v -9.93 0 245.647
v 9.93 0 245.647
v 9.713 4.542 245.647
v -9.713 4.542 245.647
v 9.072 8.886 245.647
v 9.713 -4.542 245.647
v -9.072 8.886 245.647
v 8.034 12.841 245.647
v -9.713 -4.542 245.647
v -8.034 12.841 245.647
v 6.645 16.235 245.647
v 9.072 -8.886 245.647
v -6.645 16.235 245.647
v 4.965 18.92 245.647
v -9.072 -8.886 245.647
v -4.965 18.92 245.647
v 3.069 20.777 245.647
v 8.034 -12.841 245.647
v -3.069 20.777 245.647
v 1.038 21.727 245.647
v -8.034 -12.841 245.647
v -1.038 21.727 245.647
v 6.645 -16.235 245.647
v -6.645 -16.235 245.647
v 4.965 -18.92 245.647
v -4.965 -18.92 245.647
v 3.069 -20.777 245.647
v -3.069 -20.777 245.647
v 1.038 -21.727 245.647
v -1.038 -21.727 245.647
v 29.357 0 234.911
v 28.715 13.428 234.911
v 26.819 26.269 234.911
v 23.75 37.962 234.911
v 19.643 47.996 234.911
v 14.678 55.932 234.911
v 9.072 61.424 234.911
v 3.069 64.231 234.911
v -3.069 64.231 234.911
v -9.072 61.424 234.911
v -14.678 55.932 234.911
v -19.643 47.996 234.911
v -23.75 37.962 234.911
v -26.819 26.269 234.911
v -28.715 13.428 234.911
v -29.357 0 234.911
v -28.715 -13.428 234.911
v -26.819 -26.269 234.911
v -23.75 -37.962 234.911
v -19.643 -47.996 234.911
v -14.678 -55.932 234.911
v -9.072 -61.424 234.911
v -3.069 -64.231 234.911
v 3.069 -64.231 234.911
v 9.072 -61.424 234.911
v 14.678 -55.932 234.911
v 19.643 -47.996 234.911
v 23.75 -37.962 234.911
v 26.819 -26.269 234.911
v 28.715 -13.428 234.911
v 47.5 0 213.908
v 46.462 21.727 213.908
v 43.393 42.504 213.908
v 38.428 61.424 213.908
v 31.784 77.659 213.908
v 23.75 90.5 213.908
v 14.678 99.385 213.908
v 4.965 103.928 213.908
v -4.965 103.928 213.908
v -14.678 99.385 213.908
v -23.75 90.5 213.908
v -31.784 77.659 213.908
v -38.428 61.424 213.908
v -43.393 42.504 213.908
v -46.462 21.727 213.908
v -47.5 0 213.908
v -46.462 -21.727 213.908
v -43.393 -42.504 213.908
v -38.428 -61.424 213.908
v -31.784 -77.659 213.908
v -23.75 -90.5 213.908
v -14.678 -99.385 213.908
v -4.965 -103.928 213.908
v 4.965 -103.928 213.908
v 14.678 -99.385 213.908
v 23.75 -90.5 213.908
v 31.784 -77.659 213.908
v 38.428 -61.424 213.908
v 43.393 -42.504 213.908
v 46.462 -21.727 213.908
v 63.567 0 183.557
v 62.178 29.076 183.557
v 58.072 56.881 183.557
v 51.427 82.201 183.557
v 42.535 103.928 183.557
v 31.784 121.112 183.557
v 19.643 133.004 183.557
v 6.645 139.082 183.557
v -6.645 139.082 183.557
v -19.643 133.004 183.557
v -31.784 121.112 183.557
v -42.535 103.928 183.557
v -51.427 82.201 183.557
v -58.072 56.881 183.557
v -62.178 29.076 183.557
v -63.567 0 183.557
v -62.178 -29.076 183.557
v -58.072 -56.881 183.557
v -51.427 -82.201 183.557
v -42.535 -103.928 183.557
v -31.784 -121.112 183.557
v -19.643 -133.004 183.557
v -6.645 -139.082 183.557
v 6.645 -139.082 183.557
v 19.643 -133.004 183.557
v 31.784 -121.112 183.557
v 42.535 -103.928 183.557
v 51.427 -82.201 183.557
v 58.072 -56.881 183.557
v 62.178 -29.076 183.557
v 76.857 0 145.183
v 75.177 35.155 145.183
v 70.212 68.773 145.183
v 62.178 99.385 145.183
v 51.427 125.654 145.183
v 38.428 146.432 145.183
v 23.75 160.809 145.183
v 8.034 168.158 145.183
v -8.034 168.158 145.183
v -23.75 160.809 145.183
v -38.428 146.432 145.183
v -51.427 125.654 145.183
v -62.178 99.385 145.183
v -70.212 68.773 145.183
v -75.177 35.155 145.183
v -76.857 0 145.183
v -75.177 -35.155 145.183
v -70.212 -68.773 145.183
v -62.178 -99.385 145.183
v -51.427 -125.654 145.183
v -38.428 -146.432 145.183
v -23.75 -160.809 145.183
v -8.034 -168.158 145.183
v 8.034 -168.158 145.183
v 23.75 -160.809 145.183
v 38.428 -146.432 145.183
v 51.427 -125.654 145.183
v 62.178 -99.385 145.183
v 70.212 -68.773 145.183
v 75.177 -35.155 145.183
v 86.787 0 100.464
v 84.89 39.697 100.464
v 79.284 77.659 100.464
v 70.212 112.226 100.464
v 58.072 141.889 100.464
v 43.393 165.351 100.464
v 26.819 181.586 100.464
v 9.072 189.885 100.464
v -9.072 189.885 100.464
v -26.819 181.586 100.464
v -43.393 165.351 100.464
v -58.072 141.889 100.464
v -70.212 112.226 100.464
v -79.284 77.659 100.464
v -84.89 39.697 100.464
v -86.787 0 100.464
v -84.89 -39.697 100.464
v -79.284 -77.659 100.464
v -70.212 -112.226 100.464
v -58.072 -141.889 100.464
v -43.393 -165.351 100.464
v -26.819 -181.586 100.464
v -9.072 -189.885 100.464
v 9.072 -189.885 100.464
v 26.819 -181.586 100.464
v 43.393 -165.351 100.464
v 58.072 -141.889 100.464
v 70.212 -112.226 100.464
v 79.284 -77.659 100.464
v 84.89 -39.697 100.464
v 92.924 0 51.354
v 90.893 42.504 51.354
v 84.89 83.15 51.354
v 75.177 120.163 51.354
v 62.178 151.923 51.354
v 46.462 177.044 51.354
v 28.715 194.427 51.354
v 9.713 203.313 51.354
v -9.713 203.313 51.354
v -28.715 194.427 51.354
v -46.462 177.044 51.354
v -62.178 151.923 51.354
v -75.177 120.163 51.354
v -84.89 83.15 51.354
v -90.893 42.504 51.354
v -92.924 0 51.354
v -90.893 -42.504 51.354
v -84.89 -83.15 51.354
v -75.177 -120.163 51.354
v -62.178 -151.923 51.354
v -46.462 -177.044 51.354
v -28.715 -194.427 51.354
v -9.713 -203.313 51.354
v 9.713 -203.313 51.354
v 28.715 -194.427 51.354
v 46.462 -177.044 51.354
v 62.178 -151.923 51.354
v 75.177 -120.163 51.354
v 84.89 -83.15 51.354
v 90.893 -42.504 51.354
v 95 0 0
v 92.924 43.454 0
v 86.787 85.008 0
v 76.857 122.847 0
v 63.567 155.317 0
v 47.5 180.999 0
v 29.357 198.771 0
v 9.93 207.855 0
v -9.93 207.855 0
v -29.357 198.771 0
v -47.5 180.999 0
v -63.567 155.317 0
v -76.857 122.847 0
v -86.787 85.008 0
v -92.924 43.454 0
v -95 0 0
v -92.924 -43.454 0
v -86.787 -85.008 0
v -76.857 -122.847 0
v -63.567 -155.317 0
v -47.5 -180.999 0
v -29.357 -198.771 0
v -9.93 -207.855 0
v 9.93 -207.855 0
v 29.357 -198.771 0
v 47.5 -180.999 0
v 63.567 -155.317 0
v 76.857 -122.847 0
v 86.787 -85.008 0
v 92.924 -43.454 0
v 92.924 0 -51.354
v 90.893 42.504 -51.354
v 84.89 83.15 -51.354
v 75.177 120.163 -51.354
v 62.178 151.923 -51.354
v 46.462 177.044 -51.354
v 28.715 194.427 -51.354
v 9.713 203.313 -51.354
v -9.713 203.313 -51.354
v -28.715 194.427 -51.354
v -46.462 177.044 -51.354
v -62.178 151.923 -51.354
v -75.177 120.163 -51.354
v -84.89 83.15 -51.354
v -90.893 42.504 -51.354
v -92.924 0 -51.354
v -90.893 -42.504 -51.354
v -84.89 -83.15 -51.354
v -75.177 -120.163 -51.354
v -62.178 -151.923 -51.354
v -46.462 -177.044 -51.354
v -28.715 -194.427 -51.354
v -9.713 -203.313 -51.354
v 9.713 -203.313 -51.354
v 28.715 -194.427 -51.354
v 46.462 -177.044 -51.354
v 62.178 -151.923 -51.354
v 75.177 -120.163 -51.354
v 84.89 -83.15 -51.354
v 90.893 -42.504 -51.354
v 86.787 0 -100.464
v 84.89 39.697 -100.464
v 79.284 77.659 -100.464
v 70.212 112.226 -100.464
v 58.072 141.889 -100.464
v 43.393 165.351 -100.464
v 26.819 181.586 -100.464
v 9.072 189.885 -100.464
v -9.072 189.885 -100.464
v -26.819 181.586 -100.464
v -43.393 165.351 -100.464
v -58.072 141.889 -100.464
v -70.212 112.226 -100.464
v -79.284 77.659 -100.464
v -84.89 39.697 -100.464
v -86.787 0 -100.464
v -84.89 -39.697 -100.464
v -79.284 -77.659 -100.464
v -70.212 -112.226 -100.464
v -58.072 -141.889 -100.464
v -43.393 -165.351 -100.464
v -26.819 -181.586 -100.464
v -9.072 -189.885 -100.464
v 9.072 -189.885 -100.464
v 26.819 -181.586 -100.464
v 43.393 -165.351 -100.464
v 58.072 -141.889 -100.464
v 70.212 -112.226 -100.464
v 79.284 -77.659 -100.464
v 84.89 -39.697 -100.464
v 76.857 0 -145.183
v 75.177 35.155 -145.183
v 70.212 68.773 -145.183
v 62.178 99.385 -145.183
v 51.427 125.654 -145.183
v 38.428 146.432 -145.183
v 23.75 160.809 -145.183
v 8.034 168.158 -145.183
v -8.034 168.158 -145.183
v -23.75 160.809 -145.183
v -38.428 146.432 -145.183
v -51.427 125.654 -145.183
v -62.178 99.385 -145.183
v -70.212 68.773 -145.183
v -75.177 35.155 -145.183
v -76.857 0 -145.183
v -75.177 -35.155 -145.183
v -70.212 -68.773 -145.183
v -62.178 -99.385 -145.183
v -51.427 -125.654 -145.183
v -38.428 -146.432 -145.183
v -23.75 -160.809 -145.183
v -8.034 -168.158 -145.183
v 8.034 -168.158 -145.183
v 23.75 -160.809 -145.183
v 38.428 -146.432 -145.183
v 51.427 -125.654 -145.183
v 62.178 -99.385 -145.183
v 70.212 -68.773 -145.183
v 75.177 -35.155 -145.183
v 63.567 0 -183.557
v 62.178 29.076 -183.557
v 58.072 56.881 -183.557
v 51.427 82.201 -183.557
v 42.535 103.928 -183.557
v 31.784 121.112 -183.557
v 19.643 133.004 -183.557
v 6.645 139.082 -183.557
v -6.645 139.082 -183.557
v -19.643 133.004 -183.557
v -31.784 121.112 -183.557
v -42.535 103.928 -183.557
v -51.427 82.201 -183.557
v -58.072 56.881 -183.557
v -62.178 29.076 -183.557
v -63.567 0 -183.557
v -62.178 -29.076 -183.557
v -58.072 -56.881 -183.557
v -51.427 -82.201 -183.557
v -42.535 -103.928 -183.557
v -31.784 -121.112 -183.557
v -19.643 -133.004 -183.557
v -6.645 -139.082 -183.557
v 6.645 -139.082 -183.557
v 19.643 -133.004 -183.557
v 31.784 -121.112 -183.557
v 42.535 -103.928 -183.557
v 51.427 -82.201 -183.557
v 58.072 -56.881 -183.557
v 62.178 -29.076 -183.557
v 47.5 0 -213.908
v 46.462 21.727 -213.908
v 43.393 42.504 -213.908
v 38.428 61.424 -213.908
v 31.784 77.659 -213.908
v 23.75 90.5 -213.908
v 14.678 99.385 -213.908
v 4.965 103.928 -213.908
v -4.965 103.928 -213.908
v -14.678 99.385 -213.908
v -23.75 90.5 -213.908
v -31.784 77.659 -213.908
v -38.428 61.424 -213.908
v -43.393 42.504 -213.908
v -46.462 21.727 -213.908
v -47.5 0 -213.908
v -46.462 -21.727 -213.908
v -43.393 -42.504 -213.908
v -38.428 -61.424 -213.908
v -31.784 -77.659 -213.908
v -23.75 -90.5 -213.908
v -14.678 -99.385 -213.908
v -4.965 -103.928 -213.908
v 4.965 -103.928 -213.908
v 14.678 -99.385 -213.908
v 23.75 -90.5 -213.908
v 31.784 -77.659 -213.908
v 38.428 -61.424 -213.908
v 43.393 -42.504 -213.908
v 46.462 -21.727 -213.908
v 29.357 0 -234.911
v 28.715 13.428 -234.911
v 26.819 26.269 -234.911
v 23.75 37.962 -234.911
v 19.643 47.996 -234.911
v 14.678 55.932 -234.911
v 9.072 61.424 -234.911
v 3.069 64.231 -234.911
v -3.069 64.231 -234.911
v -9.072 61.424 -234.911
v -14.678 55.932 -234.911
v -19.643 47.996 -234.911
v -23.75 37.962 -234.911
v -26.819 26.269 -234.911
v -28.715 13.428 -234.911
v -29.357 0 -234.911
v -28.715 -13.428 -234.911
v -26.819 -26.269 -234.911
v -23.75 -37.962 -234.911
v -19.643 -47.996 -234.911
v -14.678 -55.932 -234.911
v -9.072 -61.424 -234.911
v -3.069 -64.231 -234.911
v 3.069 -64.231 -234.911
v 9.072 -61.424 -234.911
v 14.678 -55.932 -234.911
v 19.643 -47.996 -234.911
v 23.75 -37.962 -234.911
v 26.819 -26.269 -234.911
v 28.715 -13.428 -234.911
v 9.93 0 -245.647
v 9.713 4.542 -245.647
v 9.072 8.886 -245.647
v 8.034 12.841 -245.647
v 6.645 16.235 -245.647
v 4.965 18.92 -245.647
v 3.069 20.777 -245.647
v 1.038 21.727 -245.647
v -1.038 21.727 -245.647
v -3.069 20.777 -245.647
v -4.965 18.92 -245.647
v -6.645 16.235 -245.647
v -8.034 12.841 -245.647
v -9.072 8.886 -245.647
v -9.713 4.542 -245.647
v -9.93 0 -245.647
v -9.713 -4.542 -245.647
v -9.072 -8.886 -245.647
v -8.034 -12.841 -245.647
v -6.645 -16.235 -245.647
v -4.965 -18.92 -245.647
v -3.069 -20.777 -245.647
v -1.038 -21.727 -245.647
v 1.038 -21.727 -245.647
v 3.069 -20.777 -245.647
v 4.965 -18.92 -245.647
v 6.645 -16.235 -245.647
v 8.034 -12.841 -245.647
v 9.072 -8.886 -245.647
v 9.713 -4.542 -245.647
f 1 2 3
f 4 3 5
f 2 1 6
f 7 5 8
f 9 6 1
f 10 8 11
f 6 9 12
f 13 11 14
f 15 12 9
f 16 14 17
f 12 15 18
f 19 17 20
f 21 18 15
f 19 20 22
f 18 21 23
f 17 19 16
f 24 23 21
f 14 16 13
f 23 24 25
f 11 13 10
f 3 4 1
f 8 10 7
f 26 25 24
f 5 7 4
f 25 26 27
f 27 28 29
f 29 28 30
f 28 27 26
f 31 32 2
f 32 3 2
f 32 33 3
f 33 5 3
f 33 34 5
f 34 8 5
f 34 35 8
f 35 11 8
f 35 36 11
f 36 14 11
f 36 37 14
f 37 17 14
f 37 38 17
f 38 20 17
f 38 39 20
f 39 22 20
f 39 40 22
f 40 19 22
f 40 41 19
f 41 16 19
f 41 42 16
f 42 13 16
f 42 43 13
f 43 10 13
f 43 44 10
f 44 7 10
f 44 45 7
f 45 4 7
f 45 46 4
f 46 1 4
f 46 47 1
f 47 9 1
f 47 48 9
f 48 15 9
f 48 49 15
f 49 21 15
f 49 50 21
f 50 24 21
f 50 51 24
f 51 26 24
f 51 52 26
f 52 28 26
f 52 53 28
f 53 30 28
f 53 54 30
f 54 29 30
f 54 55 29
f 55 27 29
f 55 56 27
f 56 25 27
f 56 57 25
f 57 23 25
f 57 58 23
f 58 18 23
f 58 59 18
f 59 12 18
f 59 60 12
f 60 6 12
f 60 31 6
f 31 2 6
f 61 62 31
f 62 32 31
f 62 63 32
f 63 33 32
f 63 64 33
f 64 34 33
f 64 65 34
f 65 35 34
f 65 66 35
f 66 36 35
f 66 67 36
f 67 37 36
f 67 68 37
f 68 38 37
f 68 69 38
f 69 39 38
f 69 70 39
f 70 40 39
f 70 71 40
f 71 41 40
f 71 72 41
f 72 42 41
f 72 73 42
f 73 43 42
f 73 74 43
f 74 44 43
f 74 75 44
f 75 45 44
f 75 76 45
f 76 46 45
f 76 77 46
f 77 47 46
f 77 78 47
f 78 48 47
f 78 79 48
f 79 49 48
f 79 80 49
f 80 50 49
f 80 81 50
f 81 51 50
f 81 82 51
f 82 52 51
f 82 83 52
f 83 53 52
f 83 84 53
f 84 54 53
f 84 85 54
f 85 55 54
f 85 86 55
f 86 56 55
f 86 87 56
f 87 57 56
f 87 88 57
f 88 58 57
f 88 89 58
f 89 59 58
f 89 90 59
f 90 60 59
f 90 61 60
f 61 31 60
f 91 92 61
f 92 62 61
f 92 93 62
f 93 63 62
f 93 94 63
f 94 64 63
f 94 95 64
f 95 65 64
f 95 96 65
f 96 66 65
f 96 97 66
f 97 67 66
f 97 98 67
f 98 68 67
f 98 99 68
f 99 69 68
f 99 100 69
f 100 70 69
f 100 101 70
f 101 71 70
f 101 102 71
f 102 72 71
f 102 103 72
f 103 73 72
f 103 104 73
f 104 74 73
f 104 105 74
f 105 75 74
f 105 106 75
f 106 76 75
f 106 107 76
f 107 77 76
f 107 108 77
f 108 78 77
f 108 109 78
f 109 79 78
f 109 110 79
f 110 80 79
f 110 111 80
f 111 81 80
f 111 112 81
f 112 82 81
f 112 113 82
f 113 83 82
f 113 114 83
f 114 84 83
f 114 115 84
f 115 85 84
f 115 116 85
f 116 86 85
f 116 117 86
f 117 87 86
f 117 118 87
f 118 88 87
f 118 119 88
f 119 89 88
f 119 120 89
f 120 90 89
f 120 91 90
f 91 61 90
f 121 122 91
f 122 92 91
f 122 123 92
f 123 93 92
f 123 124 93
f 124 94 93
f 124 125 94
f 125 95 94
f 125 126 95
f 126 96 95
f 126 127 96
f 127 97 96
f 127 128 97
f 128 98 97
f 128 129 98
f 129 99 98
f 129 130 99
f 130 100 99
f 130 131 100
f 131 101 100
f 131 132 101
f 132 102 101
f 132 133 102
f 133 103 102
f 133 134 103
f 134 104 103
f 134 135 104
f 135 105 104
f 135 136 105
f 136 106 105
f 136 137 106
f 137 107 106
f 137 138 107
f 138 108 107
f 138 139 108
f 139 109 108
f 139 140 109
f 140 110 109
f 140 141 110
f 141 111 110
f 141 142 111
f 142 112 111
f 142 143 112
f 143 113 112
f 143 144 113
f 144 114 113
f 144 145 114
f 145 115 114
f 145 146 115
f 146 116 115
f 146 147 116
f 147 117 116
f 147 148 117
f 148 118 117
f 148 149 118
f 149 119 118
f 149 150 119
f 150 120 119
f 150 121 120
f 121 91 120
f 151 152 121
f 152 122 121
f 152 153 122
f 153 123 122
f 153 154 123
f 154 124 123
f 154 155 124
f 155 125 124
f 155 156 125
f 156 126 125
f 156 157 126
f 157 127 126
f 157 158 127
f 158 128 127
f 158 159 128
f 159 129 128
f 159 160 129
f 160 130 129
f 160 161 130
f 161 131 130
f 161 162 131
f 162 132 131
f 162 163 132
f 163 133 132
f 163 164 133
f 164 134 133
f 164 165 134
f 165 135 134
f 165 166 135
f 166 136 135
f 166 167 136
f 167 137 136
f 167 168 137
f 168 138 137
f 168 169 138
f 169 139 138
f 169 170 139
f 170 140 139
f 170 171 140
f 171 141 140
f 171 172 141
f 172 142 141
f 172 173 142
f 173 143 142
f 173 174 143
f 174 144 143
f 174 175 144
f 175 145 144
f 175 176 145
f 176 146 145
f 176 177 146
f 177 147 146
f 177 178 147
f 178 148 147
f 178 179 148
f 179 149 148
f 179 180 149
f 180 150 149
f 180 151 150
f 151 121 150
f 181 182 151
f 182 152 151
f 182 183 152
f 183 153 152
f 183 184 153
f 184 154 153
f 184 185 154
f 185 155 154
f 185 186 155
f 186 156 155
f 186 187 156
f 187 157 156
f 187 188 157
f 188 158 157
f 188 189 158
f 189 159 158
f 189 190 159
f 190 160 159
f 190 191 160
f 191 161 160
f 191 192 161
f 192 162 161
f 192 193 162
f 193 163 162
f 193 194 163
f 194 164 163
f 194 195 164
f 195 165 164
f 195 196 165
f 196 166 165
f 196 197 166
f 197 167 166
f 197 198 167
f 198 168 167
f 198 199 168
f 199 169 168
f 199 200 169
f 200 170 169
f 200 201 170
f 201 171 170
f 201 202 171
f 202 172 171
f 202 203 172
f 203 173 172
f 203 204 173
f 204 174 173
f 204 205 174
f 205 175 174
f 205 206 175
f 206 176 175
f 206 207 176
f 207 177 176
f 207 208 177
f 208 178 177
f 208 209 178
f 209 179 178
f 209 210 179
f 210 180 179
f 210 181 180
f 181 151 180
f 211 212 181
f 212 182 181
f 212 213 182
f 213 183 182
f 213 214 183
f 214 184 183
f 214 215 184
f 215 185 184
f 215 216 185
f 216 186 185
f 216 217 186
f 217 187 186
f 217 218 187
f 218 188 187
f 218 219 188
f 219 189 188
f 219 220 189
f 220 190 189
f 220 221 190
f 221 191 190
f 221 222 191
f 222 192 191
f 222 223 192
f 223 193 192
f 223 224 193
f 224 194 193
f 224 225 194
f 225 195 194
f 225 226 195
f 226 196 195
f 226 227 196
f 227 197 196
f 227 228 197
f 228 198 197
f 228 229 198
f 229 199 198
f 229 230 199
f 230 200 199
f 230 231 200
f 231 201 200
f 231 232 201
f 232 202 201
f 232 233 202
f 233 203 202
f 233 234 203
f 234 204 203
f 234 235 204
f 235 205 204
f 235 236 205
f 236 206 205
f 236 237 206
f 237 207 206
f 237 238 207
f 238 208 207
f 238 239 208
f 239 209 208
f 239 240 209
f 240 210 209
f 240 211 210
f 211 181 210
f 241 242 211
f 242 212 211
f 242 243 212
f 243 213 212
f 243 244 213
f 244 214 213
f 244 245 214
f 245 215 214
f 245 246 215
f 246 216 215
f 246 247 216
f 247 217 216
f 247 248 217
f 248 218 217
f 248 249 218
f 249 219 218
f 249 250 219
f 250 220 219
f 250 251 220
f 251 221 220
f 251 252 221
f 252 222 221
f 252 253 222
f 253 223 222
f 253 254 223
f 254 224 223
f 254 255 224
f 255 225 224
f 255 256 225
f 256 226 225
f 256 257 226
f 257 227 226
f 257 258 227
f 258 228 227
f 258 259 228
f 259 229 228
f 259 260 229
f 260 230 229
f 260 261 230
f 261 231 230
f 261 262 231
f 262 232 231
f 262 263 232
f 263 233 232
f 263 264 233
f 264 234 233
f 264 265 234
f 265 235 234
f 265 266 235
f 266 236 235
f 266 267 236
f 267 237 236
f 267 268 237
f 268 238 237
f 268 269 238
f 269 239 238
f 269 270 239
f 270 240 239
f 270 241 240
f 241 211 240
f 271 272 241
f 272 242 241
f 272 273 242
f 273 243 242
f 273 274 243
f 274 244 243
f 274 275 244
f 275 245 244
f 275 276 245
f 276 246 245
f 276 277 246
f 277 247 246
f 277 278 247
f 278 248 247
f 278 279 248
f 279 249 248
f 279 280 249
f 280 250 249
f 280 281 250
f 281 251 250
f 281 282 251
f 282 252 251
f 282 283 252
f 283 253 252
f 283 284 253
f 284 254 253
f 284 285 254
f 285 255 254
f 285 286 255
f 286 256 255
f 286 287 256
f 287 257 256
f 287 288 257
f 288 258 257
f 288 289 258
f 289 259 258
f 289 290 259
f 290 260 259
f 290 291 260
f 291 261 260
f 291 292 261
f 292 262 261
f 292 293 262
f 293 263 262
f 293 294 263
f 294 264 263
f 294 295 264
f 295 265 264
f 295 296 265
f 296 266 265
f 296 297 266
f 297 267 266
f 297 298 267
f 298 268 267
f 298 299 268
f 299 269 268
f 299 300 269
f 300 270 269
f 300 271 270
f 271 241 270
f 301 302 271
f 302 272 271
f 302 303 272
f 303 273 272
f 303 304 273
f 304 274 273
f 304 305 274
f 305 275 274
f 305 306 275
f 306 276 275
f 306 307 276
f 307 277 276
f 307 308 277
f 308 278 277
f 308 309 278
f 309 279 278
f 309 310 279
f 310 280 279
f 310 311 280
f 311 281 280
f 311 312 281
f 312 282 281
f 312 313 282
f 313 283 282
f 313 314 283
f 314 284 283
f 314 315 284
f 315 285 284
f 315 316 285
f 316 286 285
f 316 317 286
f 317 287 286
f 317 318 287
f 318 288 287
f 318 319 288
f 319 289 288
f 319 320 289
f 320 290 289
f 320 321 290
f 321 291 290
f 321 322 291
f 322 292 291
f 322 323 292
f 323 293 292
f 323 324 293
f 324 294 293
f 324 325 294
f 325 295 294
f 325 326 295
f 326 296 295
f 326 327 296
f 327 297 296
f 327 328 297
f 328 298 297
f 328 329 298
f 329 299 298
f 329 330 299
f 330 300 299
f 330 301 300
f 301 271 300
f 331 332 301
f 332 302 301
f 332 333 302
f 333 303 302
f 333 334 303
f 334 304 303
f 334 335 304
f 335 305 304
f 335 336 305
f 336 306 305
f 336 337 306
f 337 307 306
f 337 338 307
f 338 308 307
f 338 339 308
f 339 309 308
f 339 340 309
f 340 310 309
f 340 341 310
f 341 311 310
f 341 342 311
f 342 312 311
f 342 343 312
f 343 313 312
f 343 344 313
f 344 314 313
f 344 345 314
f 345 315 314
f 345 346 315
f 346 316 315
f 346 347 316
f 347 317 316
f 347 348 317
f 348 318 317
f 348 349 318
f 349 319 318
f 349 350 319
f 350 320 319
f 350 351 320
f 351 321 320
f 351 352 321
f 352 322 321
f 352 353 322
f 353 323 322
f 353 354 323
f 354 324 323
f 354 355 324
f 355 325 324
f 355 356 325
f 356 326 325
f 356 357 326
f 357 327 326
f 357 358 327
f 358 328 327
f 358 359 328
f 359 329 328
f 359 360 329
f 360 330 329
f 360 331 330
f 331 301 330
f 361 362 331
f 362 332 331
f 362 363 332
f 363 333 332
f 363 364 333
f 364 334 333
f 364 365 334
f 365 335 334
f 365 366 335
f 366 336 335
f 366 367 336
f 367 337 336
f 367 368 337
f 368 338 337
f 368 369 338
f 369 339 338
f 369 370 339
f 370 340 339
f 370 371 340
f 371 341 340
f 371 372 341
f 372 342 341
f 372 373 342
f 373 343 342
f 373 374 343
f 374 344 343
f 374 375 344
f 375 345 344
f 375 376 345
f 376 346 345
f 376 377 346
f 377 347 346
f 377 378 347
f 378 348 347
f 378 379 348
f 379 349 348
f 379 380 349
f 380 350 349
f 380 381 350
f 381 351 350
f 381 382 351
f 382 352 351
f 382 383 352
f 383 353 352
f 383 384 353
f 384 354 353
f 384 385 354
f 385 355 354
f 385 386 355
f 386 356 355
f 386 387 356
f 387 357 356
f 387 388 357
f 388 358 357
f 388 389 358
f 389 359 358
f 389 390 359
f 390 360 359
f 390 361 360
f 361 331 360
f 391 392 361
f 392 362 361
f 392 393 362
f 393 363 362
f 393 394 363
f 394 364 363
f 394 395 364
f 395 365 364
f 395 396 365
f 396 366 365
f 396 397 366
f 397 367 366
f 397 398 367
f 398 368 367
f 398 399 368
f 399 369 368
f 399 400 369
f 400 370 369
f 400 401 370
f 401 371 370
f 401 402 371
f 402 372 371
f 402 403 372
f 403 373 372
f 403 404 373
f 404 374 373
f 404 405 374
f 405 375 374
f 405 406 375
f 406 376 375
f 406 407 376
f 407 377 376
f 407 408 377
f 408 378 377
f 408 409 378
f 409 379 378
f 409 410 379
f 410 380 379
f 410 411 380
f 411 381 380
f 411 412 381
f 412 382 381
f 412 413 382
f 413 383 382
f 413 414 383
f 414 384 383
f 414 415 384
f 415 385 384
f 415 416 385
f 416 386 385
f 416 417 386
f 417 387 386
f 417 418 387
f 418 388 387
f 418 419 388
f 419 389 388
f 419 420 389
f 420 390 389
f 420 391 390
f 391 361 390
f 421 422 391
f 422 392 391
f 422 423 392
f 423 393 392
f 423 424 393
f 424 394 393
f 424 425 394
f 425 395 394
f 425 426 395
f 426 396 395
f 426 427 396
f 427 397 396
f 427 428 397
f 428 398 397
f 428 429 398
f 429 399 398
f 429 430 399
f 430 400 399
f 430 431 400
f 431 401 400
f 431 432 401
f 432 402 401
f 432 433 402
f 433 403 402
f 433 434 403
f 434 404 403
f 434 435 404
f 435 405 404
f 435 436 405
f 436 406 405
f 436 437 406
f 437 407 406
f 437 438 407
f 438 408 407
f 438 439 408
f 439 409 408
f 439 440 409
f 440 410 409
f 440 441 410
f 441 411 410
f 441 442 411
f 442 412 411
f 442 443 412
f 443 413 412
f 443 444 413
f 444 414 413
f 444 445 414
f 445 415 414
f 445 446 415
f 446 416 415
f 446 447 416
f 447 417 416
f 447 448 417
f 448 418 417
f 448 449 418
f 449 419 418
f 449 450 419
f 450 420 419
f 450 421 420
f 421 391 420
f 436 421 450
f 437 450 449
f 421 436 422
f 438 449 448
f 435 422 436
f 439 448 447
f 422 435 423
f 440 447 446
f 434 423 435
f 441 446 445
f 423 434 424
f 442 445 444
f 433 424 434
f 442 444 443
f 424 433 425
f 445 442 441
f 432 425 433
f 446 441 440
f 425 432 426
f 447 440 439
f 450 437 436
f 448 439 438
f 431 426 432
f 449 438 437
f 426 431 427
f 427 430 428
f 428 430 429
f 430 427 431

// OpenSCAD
// Generated by SolidPython 1.0.1 on 2020-07-29 00:39:26


scale(v = [5, 11, 13]) {
	sphere(r = 19);
}
/***********************************************
*********      SolidPython code:      **********
************************************************
 
# import packages: SolidPython
from solid import *
from solid.utils import *
from itertools import chain, combinations


class Resize:

    def __init__(self, scad_file):
        self.scad_file = scad_file
        #self.scad_file = import_scad(scad_file)
        # cone/cylinder param:
        self.r1 = 0
        self.r2 = 0
        self.h = 0
        # rectangular prism param:
        self.w = 0
        self.l = 0
        # ellipse param:
        self.r = 0

    # import OpenScad code (file name corresponds to shape)


    # classify shape + parameters
    def assign(self, param1, param2, param3):
        if self.scad_file == 'cone.scad':
            self.r1 = param1
            self.r2 = param2
            self.h = param3
        elif self.scad_file == 'cylinder.scad':
            self.r1 = param1
            self.r2 = param2
            self.h = param3
        elif self.scad_file == 'rectangularPrism.scad':
            self.h = param1
            self.l = param2
            self.w = param3
        else:
            self.r = param1
            self.h = param2

    # resize parameters
    def iterate(self):
        x = range(3, 20, 2)
        i = 1
        if self.scad_file == 'cone.scad':
            tempList = list(combinations(x, 2))
            for temp in tempList:
                param1 = temp[0]
                param2 = temp[1]
                filepath = 'produced_scad_files/' + 'cone' + str(param1) + '_' + str(param2) + '_' + '.scad'
                scad_render_to_file(cylinder(h=param1, r1=param2, r2=0), filepath)

        elif self.scad_file == 'cylinder.scad':
            tempList = list(combinations(x, 3))
            for temp in tempList:
                param1 = temp[0]
                param2 = temp[1]
                filepath = 'produced_scad_files/' + 'cylinder' + str(param1) + '_' + str(param2) + '_' + '.scad'
                scad_render_to_file(cylinder(h=param1, r1=param2, r2=param2), filepath)

        elif self.scad_file == 'rectangularPrism.scad':
            tempList = list(combinations(x, 3))
            for temp in tempList:
                param1 = temp[0]
                param2 = temp[1]
                param3 = temp[2]
                filepath = 'produced_scad_files/' + 'rectangularPrism' + str(param1) + '_' + str(param2) + '_' + str(
                    param3) + '.scad'
                scad_render_to_file(cube(size=(param1, param2, param3)), filepath)

        elif self.scad_file == 'ellipse.scad':
            tempList = list(combinations(x, 4))
            for temp in tempList:
                param1 = temp[0]
                param2 = temp[1]
                param3 = temp[2]
                param4 = temp[3]
                filepath = 'produced_scad_files/' + 'ellipse' + str(param1) + '_' + str(param2) + '_' + str(param3) + '_' + str(param4) + '.scad'
                scad_render_to_file(scale([param1, param2, param3])(sphere(r=param4)), filepath)

    def render_to_scadfile(self):
        scad_render_to_file(scad, 'example.scad') 
 
************************************************/
